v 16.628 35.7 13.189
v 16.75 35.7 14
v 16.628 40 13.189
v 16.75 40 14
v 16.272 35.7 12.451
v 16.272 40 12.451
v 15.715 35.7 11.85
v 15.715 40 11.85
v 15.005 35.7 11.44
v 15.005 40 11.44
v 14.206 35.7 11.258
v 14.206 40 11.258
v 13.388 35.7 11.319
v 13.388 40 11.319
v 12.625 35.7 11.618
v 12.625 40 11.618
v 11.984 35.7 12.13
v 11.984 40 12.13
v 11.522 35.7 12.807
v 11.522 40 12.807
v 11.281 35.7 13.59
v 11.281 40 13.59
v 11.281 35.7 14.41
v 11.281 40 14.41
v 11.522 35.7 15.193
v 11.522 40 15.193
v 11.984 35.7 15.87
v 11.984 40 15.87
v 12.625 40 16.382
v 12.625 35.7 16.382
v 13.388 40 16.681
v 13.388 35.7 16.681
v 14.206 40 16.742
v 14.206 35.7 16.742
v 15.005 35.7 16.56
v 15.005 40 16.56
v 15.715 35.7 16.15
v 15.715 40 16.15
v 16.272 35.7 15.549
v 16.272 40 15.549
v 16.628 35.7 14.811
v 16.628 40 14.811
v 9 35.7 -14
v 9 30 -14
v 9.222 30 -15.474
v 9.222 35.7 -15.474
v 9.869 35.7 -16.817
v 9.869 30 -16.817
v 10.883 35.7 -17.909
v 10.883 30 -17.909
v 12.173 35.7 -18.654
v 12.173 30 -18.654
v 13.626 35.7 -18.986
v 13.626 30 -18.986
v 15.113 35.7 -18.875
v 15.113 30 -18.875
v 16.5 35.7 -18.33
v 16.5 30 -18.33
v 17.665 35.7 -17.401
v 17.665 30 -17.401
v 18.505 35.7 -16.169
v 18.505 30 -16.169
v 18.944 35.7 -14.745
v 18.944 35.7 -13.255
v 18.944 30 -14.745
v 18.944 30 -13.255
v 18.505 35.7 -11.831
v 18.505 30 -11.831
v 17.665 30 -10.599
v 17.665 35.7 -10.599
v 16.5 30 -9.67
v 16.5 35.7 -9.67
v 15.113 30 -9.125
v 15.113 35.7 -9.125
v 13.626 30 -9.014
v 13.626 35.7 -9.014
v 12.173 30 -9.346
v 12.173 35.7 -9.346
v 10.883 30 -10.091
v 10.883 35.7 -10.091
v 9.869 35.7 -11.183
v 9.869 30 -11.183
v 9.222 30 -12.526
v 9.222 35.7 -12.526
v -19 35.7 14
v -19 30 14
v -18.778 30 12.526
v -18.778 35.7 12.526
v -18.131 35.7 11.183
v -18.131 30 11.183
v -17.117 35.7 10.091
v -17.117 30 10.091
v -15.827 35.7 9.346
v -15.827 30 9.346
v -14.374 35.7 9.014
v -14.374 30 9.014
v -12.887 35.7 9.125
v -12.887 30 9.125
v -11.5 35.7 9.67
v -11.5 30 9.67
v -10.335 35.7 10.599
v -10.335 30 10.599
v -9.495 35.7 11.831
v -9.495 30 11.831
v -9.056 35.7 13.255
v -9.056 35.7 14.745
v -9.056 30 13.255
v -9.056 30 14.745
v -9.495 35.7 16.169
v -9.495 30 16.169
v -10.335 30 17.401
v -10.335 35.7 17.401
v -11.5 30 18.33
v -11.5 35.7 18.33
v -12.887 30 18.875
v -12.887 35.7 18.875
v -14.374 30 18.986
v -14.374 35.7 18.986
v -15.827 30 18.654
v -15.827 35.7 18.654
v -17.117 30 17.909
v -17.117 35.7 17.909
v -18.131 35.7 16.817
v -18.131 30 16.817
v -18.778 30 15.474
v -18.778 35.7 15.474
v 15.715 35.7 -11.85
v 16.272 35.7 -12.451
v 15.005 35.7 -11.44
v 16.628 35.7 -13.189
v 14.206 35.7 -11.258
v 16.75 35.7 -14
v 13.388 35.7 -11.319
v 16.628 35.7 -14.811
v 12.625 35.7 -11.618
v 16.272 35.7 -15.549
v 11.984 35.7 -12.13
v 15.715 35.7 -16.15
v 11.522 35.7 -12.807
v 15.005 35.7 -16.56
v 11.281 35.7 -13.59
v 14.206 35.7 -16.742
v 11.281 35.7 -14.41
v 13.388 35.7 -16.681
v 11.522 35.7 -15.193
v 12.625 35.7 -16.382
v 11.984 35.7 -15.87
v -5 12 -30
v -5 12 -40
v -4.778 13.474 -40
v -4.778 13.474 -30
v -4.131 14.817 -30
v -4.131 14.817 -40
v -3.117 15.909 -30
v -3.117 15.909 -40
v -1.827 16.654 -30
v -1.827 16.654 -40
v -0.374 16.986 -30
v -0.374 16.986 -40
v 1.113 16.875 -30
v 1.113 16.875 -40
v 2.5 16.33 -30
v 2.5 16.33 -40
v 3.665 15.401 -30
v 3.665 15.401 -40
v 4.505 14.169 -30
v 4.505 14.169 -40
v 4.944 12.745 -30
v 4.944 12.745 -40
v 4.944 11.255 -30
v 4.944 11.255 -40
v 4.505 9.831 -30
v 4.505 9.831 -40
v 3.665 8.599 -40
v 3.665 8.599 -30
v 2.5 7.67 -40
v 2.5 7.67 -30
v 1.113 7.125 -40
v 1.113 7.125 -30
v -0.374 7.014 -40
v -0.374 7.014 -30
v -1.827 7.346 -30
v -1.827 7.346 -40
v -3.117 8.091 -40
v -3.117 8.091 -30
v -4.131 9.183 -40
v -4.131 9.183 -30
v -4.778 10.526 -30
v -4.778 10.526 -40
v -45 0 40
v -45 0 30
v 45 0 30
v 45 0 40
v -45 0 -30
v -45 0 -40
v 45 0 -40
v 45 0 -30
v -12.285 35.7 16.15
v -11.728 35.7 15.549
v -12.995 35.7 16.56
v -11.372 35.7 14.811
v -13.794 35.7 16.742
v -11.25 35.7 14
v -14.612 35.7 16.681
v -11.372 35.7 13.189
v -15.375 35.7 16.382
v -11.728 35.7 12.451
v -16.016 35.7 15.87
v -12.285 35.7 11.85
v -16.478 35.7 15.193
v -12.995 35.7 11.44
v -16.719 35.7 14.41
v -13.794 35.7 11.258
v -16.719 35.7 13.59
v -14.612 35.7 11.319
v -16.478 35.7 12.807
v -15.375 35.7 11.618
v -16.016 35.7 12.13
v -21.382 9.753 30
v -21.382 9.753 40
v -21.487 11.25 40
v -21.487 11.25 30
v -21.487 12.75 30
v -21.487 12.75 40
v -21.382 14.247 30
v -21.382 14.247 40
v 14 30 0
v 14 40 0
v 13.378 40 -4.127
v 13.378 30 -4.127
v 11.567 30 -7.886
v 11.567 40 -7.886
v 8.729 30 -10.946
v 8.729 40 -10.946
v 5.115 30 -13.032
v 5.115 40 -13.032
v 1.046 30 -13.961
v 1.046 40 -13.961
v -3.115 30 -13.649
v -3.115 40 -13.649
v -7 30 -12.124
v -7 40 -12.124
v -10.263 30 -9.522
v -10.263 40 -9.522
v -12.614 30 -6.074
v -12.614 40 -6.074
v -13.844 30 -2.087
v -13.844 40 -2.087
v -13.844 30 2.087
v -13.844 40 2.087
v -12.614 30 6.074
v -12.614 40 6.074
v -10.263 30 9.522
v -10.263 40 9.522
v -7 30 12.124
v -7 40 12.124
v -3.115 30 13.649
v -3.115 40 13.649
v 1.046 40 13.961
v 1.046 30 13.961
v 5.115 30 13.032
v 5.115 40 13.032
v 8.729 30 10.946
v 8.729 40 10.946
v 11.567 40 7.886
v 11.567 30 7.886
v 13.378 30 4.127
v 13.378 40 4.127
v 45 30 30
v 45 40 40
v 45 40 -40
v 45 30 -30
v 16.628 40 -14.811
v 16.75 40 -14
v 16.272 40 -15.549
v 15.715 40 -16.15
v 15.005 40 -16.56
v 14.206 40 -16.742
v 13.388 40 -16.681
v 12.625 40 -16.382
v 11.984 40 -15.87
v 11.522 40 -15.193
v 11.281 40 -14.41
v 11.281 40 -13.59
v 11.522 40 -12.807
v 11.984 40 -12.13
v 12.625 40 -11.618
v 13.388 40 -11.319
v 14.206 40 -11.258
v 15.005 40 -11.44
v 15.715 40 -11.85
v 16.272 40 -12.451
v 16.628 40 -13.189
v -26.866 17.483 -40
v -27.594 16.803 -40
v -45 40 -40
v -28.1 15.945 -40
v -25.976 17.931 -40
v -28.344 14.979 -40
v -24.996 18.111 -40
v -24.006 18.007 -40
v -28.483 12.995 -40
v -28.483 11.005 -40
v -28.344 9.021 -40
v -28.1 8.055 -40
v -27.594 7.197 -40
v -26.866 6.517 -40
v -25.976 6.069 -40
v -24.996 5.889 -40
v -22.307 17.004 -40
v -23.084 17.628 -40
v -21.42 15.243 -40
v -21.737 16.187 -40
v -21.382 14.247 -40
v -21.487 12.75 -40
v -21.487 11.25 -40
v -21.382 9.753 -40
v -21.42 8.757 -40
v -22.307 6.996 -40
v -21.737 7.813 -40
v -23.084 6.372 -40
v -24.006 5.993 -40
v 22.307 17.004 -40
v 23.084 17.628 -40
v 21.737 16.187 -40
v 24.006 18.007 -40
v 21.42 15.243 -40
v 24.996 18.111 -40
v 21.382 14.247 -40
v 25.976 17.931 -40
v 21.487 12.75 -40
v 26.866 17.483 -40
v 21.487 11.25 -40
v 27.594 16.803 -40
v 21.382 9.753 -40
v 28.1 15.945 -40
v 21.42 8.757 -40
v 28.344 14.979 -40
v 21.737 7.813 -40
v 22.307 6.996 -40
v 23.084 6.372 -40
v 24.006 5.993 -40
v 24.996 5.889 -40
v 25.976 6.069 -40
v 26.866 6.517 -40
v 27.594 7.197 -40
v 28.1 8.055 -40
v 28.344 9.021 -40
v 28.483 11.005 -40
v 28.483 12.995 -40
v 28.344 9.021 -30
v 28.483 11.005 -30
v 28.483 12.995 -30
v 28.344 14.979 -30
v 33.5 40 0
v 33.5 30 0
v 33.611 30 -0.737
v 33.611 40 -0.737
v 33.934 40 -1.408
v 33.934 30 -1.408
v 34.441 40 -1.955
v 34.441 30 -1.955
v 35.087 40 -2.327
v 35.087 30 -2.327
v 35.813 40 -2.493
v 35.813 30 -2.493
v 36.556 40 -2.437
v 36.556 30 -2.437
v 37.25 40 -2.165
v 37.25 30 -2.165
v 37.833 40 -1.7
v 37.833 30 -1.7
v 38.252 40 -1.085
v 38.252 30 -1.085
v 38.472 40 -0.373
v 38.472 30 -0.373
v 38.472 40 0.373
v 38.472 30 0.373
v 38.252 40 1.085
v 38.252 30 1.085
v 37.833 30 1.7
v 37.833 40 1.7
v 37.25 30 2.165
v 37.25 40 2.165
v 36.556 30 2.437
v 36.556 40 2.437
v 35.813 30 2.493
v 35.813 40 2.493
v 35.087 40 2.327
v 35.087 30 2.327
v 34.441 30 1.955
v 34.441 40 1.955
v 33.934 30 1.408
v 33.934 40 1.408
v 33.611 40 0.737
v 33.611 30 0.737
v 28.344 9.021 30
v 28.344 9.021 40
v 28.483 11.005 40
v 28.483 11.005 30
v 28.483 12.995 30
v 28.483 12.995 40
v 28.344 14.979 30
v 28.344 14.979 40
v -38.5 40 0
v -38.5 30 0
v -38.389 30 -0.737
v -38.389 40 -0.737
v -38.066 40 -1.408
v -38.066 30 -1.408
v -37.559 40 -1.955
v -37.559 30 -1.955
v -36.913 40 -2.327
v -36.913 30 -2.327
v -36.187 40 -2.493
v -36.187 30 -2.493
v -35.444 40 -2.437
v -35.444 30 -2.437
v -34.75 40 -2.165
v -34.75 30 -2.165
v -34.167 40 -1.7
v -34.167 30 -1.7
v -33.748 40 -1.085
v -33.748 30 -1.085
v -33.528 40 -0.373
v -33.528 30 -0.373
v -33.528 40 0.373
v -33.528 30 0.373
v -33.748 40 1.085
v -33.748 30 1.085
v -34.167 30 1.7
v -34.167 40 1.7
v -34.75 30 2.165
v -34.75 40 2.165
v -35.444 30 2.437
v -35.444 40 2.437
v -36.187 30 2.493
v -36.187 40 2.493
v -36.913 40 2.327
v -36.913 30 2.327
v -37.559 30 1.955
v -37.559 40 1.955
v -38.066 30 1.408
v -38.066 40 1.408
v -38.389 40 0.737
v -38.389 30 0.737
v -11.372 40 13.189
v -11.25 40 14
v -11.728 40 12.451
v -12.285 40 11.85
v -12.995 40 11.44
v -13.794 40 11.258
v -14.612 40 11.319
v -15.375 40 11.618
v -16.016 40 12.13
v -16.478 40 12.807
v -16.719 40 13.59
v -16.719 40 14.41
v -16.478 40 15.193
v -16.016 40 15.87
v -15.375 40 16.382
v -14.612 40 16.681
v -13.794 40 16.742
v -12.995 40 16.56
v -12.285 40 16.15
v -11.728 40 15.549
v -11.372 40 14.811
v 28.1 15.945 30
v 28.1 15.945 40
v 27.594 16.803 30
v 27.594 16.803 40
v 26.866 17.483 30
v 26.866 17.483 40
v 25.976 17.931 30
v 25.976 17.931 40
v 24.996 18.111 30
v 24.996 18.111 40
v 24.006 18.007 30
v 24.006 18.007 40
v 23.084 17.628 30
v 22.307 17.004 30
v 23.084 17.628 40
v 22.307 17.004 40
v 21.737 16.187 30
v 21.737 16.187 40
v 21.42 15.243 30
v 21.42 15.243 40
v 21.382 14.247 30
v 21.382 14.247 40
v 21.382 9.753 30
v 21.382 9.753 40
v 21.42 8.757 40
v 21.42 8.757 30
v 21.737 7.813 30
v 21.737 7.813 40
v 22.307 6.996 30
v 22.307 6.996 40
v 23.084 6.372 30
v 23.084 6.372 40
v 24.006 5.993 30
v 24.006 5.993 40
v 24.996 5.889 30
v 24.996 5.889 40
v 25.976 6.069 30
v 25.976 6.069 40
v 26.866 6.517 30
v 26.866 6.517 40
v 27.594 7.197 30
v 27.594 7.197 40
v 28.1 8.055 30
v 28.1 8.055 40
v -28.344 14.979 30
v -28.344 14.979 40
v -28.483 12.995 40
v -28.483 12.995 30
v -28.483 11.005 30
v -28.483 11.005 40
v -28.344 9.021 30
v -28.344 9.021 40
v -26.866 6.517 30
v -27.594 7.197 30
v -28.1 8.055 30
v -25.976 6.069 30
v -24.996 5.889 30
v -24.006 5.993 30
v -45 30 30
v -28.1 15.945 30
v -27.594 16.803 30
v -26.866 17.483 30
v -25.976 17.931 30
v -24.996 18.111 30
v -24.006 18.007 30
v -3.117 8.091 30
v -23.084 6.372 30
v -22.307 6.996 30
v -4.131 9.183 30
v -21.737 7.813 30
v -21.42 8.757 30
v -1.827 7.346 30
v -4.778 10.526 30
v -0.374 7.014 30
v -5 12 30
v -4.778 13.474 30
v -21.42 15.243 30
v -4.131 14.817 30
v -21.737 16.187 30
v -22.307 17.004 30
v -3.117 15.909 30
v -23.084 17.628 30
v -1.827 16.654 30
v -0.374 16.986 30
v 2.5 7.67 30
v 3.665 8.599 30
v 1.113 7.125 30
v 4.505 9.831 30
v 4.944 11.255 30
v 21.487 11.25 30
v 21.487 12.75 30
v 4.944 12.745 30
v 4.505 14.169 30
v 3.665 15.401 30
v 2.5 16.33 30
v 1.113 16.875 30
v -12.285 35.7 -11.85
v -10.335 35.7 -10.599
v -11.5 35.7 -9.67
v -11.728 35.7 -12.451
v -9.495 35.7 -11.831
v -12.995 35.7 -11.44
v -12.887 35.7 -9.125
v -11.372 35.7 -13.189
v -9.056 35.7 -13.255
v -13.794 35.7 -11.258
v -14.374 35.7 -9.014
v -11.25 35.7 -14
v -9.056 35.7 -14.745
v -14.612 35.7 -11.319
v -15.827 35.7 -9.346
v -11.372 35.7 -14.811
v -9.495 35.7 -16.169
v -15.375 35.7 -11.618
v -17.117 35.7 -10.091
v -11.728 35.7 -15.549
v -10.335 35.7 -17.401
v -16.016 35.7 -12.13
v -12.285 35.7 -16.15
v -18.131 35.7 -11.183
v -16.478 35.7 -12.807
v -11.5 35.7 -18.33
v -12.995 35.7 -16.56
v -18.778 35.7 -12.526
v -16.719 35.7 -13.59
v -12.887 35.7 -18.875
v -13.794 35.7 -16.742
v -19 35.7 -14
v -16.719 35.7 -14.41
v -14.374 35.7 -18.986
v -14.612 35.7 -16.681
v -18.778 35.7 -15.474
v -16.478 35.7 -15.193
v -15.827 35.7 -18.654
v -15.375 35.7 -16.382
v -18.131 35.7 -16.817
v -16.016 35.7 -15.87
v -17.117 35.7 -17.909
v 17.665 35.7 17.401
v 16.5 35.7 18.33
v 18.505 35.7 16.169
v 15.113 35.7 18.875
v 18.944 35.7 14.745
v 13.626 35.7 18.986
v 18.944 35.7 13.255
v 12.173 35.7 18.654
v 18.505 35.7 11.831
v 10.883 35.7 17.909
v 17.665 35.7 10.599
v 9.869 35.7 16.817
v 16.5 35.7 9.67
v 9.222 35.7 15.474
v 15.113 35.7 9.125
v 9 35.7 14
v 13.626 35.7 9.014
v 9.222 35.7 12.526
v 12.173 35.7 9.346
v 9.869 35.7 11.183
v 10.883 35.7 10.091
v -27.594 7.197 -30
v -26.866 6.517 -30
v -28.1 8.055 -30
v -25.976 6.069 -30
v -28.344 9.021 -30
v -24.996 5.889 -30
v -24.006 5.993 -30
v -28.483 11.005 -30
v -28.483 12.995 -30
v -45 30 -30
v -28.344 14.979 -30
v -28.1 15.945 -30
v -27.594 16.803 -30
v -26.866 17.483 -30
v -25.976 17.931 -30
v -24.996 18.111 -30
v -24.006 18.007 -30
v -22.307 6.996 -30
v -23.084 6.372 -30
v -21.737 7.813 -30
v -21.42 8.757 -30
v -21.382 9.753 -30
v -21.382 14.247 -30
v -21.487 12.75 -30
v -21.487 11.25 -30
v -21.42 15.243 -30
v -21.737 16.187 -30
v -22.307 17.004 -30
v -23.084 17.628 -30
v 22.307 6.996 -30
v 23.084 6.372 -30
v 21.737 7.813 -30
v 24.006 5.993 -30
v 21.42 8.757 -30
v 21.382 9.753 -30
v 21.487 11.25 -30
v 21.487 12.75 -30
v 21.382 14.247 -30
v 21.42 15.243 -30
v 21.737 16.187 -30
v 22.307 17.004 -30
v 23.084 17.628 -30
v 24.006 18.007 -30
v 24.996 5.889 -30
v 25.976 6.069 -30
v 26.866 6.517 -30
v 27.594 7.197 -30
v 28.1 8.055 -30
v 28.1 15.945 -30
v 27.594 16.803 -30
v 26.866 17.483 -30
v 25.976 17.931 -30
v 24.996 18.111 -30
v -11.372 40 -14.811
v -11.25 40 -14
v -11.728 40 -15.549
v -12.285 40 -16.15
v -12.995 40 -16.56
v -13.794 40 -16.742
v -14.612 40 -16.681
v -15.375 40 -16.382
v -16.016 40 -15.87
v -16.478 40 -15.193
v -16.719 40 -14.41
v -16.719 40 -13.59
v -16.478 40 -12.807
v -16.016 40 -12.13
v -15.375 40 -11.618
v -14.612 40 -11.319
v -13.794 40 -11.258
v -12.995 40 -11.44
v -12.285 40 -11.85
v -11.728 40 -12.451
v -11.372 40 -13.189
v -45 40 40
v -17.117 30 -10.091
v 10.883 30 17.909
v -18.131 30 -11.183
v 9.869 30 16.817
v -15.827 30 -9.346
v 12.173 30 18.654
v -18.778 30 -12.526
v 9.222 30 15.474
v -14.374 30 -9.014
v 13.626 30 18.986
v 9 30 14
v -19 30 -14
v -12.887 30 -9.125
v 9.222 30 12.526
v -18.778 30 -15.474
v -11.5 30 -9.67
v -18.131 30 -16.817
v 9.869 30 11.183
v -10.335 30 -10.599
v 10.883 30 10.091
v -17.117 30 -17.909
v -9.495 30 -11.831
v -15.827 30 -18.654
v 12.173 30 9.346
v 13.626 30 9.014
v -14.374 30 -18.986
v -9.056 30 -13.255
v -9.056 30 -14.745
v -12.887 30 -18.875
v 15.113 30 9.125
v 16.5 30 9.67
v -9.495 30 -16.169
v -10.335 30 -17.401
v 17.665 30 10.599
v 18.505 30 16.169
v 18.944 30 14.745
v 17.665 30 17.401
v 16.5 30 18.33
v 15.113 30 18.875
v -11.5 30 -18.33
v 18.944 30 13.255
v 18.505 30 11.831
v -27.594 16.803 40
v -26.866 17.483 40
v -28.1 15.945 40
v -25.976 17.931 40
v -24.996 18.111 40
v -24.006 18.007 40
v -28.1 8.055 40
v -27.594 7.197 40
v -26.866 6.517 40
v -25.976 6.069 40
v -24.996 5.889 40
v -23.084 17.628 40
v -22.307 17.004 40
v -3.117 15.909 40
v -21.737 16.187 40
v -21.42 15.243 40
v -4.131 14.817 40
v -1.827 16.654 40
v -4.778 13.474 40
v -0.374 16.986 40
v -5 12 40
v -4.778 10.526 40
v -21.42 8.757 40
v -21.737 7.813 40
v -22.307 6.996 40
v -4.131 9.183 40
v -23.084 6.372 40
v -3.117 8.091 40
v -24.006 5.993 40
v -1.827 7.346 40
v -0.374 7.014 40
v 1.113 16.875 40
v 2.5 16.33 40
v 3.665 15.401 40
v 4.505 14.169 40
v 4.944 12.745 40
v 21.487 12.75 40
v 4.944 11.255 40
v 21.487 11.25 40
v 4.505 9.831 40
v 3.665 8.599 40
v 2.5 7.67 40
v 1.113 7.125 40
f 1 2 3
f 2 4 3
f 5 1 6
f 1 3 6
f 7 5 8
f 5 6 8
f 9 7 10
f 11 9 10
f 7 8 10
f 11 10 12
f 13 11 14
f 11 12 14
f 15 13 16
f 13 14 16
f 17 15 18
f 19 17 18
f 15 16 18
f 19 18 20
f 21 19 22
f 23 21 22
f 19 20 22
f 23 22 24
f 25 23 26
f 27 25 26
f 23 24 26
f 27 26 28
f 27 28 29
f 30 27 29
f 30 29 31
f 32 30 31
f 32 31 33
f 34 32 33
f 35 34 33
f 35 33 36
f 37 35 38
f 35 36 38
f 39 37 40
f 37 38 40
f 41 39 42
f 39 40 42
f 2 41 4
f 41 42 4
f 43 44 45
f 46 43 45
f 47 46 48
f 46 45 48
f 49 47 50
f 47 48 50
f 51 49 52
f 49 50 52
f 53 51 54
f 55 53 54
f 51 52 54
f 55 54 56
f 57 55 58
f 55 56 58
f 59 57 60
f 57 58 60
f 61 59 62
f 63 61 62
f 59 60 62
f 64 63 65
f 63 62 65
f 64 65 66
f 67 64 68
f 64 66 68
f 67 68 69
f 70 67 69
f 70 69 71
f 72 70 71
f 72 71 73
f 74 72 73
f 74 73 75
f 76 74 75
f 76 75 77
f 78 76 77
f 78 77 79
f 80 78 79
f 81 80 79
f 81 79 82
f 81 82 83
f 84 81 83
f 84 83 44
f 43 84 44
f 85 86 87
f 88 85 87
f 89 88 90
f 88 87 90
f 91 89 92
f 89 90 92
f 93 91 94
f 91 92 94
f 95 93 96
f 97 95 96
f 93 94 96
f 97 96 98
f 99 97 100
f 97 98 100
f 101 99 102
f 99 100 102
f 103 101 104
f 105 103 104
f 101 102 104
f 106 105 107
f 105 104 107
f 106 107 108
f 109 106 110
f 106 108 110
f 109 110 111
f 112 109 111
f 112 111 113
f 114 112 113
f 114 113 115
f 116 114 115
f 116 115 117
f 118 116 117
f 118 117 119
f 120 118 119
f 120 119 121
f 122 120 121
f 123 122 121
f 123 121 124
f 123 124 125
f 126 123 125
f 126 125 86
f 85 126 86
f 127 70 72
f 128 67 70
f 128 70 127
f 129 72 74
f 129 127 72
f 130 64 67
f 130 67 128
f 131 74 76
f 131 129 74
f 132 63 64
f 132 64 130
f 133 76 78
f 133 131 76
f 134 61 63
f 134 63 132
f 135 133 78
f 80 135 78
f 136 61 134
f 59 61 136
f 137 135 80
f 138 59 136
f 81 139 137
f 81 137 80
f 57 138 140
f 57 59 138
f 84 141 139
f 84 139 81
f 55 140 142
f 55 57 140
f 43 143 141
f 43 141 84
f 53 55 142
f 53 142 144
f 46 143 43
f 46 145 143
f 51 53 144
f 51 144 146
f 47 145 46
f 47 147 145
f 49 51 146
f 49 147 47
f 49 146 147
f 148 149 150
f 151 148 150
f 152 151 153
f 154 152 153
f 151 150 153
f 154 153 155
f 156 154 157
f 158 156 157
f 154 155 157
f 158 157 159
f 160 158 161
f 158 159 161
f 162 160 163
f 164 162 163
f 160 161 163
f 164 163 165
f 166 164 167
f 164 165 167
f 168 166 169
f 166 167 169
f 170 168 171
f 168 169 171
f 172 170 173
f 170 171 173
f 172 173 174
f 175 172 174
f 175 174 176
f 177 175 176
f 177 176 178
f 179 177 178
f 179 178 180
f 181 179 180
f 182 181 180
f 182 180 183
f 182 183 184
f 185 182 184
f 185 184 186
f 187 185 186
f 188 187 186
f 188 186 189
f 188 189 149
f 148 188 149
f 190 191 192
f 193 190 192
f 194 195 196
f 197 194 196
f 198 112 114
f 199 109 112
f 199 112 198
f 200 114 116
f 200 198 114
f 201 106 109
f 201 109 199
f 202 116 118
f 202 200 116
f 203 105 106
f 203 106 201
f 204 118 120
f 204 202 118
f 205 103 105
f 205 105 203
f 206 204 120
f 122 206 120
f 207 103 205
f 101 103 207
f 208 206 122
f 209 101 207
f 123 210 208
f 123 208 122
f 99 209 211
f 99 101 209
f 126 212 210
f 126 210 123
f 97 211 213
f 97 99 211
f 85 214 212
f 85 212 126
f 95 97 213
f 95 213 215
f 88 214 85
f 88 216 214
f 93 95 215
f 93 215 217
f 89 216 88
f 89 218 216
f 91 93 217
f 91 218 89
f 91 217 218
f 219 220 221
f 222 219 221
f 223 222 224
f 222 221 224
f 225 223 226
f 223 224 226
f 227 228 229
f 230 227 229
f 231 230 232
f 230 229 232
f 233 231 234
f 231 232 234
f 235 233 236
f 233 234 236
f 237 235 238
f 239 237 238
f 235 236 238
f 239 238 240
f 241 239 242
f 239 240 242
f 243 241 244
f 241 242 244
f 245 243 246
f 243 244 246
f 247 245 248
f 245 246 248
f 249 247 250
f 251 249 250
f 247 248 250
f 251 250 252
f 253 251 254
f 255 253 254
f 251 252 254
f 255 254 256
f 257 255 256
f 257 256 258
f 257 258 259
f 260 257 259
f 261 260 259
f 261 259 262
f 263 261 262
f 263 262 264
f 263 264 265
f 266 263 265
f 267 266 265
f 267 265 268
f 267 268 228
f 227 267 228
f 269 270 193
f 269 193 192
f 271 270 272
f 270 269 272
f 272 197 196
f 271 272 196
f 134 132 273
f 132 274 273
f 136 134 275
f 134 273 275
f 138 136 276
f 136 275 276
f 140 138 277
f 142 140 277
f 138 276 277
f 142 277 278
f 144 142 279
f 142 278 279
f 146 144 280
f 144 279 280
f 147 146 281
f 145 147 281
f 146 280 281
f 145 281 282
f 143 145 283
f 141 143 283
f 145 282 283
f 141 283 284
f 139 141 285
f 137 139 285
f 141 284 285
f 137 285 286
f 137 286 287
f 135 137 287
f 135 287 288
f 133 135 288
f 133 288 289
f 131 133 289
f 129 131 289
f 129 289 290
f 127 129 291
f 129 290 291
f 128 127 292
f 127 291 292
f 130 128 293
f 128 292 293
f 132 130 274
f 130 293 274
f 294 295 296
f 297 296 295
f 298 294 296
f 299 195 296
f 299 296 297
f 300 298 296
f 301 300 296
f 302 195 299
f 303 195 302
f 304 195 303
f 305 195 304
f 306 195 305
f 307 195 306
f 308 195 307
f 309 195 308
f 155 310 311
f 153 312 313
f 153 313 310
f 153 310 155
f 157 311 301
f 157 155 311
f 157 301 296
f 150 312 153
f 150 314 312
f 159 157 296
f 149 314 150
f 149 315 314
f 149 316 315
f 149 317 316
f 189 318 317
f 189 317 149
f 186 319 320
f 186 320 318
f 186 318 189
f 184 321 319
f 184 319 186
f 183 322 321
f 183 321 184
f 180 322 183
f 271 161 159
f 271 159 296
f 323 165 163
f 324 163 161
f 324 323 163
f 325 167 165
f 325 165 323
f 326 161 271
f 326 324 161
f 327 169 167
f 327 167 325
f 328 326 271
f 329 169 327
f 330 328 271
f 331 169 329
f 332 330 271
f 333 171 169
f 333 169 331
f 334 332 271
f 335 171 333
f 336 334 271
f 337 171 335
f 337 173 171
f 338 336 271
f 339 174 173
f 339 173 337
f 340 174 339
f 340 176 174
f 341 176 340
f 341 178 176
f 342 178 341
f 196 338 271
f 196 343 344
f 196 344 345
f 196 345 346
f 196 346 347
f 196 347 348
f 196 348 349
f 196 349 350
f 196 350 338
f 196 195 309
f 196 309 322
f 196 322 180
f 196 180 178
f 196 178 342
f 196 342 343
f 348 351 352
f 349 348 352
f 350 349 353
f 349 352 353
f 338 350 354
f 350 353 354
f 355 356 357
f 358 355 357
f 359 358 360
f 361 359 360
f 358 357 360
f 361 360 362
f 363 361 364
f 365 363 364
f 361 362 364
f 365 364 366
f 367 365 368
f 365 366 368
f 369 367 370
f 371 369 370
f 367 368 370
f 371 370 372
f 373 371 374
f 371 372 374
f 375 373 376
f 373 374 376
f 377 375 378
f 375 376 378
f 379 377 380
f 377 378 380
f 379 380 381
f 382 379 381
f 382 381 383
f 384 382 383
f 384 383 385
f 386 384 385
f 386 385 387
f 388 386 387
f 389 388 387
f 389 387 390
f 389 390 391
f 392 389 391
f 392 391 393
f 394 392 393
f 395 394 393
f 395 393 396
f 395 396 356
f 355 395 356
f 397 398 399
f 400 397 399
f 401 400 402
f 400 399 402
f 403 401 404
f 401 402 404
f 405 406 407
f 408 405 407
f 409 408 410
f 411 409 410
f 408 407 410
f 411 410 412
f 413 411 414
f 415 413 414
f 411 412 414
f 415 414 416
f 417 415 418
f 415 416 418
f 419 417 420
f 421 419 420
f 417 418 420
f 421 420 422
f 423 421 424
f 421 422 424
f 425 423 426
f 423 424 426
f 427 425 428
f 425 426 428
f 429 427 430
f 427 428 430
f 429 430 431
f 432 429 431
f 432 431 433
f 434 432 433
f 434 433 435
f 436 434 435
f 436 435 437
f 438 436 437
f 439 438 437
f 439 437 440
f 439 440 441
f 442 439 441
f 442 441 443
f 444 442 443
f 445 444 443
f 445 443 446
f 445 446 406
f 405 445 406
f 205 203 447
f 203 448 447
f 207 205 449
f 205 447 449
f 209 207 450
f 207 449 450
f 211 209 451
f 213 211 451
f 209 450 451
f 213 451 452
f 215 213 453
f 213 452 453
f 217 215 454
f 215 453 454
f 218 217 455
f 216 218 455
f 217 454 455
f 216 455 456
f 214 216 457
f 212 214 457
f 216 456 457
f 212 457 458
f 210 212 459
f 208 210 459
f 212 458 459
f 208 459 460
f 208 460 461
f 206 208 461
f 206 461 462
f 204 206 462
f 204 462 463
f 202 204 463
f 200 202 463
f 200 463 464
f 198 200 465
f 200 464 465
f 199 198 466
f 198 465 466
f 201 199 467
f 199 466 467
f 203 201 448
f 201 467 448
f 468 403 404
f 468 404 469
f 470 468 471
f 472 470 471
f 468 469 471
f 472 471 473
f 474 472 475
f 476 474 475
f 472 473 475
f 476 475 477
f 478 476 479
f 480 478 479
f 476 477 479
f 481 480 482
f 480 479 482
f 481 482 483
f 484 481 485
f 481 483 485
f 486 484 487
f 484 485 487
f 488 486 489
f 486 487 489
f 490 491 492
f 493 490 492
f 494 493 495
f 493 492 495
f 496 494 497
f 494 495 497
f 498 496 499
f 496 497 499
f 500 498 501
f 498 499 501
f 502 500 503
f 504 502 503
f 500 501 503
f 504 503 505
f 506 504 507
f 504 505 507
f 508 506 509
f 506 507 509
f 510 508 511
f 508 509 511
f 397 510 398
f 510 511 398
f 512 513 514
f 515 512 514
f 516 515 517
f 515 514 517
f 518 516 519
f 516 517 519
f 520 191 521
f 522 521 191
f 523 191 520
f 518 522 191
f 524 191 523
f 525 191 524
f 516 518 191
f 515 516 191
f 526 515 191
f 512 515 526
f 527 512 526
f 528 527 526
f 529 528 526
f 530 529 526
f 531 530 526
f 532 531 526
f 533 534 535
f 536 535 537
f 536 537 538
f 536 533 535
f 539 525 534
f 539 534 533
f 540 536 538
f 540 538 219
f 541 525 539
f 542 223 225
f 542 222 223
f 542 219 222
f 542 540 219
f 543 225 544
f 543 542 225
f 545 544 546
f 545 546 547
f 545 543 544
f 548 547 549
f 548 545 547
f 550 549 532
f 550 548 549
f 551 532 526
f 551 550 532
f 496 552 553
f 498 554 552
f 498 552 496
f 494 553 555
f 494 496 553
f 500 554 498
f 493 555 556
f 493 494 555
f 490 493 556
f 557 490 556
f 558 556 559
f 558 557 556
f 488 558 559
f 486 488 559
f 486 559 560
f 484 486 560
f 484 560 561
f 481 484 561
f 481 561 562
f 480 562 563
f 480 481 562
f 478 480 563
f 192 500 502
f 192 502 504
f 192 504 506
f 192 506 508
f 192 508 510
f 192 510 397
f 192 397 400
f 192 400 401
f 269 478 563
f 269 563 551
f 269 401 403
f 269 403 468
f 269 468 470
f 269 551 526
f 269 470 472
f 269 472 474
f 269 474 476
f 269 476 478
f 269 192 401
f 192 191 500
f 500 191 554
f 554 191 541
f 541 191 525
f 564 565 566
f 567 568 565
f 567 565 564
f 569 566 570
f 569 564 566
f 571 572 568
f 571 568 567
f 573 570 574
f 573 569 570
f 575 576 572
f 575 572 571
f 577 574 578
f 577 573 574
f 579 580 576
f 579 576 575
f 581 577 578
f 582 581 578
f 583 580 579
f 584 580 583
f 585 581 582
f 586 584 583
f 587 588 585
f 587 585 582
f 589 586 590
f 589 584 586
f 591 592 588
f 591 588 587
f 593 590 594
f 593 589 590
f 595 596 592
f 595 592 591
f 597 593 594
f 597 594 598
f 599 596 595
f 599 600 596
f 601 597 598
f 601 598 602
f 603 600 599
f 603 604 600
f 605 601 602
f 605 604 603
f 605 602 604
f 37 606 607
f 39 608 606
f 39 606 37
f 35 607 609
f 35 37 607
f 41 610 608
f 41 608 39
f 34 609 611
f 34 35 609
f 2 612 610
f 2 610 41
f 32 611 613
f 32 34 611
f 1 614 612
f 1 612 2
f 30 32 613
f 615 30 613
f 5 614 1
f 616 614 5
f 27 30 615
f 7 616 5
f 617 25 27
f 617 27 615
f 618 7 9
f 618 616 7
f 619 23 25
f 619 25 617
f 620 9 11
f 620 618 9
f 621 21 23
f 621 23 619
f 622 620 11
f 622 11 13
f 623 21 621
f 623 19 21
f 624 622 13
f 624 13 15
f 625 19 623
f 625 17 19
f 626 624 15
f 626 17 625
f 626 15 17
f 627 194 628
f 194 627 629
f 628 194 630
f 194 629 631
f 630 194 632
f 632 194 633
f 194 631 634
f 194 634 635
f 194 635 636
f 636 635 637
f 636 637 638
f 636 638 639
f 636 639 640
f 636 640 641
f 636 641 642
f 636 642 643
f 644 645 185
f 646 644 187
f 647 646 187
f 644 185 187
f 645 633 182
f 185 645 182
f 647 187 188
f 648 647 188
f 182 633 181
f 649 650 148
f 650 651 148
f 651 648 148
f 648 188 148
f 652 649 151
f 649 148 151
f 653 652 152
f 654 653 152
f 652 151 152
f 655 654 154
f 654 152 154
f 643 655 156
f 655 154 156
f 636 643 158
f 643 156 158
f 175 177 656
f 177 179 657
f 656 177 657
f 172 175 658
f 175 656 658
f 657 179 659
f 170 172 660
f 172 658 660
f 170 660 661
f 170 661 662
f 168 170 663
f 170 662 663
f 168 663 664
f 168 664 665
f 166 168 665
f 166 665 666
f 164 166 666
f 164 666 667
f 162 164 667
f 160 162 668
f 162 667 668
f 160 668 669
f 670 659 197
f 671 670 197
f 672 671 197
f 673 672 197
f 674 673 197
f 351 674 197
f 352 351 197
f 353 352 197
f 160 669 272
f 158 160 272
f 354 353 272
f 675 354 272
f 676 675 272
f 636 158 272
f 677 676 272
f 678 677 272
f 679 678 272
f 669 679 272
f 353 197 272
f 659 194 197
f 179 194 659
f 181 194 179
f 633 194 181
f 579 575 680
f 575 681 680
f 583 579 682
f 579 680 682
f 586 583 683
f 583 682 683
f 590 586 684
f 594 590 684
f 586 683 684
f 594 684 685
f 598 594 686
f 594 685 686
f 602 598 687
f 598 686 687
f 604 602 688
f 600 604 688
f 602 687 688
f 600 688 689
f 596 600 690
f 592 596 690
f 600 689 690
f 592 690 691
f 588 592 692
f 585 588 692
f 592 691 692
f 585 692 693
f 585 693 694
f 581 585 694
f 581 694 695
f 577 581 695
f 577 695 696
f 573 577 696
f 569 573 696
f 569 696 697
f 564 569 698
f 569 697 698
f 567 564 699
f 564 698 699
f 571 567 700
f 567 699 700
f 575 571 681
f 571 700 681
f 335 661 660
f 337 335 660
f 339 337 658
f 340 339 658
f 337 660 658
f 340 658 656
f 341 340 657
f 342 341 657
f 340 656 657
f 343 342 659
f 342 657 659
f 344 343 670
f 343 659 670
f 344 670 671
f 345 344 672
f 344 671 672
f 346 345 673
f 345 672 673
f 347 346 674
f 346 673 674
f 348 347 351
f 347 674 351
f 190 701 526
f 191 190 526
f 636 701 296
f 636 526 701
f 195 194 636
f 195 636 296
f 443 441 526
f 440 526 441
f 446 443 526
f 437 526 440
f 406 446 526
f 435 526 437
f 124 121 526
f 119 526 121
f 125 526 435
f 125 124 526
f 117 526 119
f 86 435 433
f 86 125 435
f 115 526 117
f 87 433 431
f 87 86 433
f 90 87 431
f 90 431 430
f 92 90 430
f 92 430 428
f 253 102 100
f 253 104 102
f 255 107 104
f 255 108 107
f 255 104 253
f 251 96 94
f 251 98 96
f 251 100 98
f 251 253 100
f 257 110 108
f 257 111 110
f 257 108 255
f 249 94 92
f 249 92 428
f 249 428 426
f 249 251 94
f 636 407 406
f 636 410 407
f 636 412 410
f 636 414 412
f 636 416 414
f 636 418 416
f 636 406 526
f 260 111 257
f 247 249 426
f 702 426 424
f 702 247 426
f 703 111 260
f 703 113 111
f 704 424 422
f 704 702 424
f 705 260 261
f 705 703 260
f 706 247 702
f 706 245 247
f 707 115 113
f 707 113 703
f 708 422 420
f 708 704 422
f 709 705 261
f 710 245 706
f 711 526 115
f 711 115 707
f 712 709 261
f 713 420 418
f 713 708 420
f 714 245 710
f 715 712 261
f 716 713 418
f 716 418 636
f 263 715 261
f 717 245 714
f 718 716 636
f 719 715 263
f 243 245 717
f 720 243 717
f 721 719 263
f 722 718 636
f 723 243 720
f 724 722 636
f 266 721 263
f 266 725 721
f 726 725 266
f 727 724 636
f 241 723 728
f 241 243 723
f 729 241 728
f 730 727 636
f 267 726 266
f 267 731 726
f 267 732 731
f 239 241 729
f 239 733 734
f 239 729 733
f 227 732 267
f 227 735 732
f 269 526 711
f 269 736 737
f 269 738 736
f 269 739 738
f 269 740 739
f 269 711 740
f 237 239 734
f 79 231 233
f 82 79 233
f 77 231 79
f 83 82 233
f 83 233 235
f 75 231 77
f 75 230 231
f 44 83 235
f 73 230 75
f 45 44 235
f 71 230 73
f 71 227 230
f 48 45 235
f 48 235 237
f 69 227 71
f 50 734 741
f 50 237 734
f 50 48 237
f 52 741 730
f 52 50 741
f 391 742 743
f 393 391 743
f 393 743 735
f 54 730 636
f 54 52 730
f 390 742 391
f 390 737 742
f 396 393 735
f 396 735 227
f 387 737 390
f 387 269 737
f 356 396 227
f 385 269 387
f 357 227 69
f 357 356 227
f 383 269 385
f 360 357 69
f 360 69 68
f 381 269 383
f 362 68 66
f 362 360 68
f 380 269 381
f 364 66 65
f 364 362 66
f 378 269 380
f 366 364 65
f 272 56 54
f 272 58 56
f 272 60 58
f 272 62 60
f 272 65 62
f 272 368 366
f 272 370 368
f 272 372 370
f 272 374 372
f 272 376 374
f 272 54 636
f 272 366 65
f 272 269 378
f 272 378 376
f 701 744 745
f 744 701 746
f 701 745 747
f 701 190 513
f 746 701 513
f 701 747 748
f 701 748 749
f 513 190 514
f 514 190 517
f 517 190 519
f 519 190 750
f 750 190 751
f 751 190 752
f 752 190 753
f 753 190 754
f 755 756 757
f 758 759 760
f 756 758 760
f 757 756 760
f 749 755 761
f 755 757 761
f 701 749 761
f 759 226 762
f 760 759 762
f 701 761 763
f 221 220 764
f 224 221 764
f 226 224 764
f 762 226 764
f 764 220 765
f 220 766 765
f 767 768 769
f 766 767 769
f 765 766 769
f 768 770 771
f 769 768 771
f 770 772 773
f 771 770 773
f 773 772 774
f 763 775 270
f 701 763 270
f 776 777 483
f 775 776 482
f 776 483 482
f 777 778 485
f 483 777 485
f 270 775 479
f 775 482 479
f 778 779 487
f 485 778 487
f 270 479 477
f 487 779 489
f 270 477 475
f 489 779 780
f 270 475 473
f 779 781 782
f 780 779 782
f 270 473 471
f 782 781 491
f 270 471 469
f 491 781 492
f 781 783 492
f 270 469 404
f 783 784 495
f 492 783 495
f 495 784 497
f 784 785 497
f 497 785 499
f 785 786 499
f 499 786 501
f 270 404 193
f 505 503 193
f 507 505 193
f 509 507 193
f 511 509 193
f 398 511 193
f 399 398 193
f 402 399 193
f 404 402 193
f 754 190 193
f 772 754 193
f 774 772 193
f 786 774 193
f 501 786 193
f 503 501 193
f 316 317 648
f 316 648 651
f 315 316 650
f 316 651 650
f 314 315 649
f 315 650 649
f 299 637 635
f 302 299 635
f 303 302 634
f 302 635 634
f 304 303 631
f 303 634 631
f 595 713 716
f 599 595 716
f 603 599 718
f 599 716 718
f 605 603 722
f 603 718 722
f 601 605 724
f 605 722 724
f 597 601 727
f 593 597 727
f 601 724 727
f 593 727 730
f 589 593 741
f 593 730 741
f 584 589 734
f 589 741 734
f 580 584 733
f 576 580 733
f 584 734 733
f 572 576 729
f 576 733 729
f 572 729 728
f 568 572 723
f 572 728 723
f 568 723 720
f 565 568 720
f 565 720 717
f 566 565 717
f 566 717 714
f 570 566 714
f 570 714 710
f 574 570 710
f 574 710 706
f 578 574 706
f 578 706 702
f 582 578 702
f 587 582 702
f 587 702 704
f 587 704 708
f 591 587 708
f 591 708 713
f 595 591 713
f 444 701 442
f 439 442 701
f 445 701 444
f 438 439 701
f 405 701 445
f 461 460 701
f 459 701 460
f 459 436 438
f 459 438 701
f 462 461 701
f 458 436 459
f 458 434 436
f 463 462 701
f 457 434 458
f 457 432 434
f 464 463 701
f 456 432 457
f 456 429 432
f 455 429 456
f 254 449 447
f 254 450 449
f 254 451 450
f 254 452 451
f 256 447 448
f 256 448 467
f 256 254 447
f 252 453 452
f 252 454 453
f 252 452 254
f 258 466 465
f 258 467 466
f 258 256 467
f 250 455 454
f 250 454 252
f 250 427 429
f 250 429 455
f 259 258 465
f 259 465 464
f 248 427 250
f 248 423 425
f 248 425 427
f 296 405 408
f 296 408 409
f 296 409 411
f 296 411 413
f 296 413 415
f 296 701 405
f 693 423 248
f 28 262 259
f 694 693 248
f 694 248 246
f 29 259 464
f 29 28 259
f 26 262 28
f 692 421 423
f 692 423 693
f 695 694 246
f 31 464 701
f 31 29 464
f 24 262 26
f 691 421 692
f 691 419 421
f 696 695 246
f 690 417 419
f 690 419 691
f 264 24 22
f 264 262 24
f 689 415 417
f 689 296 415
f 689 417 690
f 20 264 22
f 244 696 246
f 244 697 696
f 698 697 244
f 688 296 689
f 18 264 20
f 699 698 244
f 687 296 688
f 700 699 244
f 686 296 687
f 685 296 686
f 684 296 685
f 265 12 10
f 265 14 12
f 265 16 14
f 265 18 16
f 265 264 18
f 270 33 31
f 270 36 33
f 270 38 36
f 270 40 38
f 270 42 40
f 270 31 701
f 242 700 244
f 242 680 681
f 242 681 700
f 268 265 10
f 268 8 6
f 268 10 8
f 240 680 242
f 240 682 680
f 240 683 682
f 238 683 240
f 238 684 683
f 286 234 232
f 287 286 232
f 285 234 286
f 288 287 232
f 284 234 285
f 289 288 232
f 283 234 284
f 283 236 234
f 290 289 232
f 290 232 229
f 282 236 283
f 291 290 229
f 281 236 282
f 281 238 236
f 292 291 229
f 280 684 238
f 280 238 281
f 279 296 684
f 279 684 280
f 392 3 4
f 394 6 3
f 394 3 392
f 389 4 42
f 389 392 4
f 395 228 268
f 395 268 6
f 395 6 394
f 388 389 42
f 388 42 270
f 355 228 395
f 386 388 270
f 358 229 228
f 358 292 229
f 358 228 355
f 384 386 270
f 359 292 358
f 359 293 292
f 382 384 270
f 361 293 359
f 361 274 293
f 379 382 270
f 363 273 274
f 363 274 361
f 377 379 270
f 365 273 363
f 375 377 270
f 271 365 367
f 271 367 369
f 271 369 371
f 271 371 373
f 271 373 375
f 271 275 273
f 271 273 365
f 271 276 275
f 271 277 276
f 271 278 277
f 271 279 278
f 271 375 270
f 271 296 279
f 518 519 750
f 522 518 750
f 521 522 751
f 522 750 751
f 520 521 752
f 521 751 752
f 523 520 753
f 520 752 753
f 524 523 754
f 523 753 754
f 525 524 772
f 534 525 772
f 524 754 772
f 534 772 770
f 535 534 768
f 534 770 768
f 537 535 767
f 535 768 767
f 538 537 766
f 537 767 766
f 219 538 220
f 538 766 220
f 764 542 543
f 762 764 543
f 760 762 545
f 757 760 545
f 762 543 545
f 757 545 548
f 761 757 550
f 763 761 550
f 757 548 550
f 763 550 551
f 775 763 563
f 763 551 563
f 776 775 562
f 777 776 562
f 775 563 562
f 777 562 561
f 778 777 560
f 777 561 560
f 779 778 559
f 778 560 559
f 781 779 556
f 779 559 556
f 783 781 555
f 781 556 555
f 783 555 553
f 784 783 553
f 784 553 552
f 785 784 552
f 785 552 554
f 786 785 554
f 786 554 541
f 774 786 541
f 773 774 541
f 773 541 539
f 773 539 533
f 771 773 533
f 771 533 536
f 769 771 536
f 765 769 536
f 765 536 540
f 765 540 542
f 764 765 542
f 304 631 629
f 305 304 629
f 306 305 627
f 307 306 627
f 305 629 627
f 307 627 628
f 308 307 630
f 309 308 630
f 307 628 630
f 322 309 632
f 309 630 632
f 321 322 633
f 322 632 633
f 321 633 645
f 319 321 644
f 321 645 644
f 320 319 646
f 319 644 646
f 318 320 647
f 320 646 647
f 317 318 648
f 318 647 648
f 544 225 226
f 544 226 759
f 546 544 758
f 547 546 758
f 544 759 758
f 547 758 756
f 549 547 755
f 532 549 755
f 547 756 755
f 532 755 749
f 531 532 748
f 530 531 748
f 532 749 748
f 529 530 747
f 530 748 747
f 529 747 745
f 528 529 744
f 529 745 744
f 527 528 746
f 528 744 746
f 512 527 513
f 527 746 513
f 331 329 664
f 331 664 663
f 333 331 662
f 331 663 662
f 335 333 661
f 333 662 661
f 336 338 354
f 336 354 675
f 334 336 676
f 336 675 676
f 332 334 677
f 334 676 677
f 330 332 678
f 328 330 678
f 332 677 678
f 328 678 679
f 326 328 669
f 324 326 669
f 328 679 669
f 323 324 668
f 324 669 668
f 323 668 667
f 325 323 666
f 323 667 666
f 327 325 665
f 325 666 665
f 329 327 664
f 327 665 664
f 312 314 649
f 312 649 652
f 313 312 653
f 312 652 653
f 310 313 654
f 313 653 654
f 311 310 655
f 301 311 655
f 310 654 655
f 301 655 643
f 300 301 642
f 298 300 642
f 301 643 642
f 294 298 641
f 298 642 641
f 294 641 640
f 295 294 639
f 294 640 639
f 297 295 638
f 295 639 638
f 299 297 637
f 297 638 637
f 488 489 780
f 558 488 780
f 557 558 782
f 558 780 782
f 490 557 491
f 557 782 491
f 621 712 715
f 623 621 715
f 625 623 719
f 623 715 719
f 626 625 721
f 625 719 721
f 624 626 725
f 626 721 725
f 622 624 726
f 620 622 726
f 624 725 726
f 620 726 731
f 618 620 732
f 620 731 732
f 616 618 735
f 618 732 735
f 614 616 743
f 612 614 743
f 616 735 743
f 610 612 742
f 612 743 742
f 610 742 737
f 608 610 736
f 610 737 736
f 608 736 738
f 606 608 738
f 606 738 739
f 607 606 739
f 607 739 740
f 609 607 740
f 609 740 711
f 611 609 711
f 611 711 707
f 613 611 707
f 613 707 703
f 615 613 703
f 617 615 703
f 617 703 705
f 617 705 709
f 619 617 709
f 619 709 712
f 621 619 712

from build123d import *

# Parameters (mm, degrees)
SKETCH_1_W                = 90
SKETCH_1_H                = 80
EXTRUDE_1_DEPTH           = 40
SKETCH_10_W               = 60
SKETCH_10_H               = 30
CUT_EXTRUDE_1_DEPTH       = 107.301458127
HOLE_WIZARD_2_D           = 10
CUT_EXTRUDE_2_DEPTH       = 101.124921973
HOLE_WIZARD_1_D           = 5.5
HOLE_WIZARD_1_CBORE_D     = 10
HOLE_WIZARD_1_CBORE_DEPTH = 5.7
HOLE_WIZARD_1_2_D         = 28
HOLE_WIZARD_M6_1_D        = 5


with BuildPart() as part:
    # 草图1 → 凸台-拉伸1 (new body)
    with BuildSketch(Plane(origin=(0, 0, 0), x_dir=(1, 0, 0), z_dir=(0, 1, 0))):
        Rectangle(SKETCH_1_W, SKETCH_1_H)
    extrude(amount=EXTRUDE_1_DEPTH)

    # 草图10 → 切除-拉伸1 (cut, through all)
    with BuildSketch(Plane(origin=(45, 0, 0), x_dir=(0, 0, -1), z_dir=(1, 0, 0))):
        with Locations((0, 15)):
            Rectangle(SKETCH_10_W, SKETCH_10_H)
    extrude(amount=-CUT_EXTRUDE_1_DEPTH, mode=Mode.SUBTRACT)

    # 孔2 (through all)
    with Locations(Plane.XY.offset(40)):
        with Locations((0, 12)):
            Hole(HOLE_WIZARD_2_D / 2)

    # 草图13 → 切除-拉伸2 (cut, through all)
    with BuildSketch(Plane.XY.offset(40)):
        with BuildLine():
            ThreePointArc((-28.343874018, 14.979061203), (-28.5, 12), (-28.343874018, 9.020938797))
            ThreePointArc((-28.343874018, 9.020938797), (-24.497197763, 5.905961785), (-21.38222075, 9.75263804))
            ThreePointArc((-21.38222075, 9.75263804), (-21.5, 12), (-21.38222075, 14.24736196))
            ThreePointArc((-21.38222075, 14.24736196), (-24.497197763, 18.094038215), (-28.343874018, 14.979061203))
        make_face()
        with BuildLine():
            ThreePointArc((21.38222075, 9.75263804), (24.497197763, 5.905961785), (28.343874018, 9.020938797))
            ThreePointArc((28.343874018, 9.020938797), (28.5, 12), (28.343874018, 14.979061203))
            ThreePointArc((28.343874018, 14.979061203), (24.497197763, 18.094038215), (21.38222075, 14.24736196))
            ThreePointArc((21.38222075, 14.24736196), (21.5, 12), (21.38222075, 9.75263804))
        make_face()
    extrude(amount=-CUT_EXTRUDE_2_DEPTH, mode=Mode.SUBTRACT)

    # Hole Wizard 1 (through all)
    with Locations(Plane(origin=(-40.148551056, 30, -46.468490431), x_dir=(-1, 0, 0), z_dir=(0, -1, 0))):
        with Locations((-26.148551056, -60.468490431), (-54.148551056, -60.468490431), (-54.148551056, -32.468490431), (-26.148551056, -32.468490431)):
            CounterBoreHole(HOLE_WIZARD_1_D / 2, HOLE_WIZARD_1_CBORE_D / 2, HOLE_WIZARD_1_CBORE_DEPTH)

    # Hole Wizard 1 2 (through all)
    with Locations(Plane(origin=(0, 0, 0), x_dir=(-1, 0, 0), z_dir=(0, -1, 0))):
        with Locations((0, 0)):
            Hole(HOLE_WIZARD_1_2_D / 2)

    # M6 螺纹孔1 (through all)
    with Locations(Plane(origin=(0, 40, 0), x_dir=(1, 0, 0), z_dir=(0, 1, 0))):
        with Locations((-36, 0), (36, 0)):
            Hole(HOLE_WIZARD_M6_1_D / 2)


solid = part.part
